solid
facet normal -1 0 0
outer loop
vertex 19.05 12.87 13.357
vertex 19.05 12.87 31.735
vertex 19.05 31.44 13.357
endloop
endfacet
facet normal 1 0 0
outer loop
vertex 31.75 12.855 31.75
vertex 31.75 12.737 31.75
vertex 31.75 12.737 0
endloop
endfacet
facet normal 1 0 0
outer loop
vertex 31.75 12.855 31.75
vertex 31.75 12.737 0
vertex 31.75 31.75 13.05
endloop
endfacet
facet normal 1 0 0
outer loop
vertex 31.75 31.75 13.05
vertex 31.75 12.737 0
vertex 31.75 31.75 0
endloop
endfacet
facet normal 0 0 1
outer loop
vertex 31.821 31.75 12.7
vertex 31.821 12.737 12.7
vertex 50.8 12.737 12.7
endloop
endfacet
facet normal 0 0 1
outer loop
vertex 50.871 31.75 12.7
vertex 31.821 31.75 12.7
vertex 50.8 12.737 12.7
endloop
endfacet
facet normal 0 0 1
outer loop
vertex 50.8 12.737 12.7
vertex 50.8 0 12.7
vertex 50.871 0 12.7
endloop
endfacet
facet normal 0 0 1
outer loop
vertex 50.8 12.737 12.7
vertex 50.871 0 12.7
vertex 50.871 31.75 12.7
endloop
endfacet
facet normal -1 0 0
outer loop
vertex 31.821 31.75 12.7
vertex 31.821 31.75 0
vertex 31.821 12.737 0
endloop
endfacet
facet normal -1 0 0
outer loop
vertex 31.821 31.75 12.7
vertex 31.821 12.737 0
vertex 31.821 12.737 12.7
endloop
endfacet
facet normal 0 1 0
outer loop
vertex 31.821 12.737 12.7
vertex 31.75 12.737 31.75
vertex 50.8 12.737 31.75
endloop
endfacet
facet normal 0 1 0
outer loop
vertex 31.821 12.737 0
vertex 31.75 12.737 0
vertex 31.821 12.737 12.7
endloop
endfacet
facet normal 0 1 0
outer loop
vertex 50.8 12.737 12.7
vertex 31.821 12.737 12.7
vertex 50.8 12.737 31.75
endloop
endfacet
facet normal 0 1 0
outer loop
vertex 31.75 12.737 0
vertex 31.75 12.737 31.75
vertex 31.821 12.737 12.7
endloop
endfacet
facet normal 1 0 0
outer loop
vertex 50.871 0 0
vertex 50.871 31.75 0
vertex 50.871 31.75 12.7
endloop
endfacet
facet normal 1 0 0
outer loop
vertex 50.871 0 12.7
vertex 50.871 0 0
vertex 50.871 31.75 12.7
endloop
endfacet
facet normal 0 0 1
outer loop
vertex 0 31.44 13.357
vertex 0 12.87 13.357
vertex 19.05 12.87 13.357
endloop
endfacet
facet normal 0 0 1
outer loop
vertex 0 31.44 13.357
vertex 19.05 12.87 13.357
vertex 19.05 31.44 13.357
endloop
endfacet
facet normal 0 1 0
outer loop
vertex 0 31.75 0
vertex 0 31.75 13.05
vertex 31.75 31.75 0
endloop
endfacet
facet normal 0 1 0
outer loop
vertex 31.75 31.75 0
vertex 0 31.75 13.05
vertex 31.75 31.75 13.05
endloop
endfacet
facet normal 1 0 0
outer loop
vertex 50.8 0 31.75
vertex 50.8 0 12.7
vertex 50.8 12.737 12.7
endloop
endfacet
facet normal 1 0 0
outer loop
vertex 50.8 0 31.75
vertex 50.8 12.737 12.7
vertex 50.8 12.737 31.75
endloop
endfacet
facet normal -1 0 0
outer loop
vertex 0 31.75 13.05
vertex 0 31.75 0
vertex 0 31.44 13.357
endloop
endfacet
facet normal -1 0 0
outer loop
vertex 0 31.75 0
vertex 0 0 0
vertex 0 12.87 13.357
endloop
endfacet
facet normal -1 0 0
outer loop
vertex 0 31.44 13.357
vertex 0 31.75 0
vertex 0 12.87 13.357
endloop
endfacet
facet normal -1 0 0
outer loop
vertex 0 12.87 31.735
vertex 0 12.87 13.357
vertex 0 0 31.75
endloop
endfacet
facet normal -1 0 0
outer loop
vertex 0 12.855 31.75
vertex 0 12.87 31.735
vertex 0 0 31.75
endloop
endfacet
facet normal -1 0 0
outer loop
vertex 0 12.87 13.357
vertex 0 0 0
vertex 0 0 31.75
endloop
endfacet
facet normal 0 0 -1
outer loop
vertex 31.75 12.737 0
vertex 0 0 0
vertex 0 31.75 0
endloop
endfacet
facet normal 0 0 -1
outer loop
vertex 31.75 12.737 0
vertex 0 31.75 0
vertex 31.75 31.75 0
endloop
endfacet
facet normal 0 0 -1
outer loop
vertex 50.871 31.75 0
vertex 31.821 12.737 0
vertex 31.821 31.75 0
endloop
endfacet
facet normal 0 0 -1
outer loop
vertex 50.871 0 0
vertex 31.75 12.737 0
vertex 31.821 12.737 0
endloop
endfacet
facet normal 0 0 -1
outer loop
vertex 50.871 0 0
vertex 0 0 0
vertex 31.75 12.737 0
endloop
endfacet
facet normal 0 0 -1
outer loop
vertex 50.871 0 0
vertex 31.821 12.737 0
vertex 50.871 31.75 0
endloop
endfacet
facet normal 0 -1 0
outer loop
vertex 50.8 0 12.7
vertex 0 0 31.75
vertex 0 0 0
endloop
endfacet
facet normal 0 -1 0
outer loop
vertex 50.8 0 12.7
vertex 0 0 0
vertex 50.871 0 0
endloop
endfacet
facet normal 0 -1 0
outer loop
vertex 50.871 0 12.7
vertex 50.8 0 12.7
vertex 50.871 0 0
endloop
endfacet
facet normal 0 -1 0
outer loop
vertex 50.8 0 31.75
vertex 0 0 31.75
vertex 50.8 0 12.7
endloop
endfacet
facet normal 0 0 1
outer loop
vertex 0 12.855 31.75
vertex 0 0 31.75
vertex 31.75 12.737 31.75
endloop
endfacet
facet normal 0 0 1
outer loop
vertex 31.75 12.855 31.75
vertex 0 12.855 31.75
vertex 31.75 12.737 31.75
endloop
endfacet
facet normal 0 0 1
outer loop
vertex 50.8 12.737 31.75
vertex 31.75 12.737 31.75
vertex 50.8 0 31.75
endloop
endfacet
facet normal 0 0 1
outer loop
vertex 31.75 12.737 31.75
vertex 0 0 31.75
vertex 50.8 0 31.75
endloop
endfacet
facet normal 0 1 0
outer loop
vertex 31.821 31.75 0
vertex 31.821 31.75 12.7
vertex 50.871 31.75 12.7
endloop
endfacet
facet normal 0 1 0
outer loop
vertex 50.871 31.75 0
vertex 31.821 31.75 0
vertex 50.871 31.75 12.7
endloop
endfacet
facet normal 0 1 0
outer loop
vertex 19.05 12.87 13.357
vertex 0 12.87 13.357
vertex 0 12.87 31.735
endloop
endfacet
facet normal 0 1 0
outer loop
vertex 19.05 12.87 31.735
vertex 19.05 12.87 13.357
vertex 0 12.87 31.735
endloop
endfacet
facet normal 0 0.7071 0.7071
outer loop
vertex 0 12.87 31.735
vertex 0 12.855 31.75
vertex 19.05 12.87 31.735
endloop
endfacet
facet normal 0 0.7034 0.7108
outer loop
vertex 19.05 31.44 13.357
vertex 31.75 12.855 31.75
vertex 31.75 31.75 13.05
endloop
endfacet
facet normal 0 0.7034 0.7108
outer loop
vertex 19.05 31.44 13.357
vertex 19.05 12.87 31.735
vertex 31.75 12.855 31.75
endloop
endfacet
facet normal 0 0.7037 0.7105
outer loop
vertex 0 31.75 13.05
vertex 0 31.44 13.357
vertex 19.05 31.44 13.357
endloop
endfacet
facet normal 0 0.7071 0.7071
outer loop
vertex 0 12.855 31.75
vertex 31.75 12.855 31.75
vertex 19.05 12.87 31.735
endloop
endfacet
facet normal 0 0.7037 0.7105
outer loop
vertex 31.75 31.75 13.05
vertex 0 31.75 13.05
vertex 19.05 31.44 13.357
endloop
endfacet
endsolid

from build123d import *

# Parameters (mm, degrees)
F0_W     = 50.8
F0_H     = 31.75
F1_DEPTH = 31.75
F2_W     = 19.05
F2_H     = 19.05
F3_DEPTH = 19.05
F4_W     = 19.05
F4_H     = 19.05
F5_DEPTH = 31.751
F6_W     = 19.05
F6_H     = 12.7
F7_DEPTH = 31.75
F9_DEPTH = 50.871556


with BuildPart() as f1:
    # F0 (on Front) → F1 (new body)
    with BuildSketch(Plane.XZ):
        with Locations((25.4, 15.875)):
            Rectangle(F0_W, F0_H)
    extrude(amount=-F1_DEPTH)

    # F2 (on Right) → F3 (cut)
    with BuildSketch(Plane.YZ):
        with Locations((22.394827, 22.882153)):
            Rectangle(F2_W, F2_H)
    extrude(amount=F3_DEPTH, mode=Mode.SUBTRACT)

    # F4 (on Top) → F5 (cut, through all)
    with BuildSketch(Plane.XY):
        with Locations((41.275, 22.261919)):
            Rectangle(F4_W, F4_H)
    extrude(amount=F5_DEPTH, mode=Mode.SUBTRACT)

    # F6 (on Front) → F7 (join)
    with BuildSketch(Plane.XZ):
        with Locations((41.345556, 6.35)):
            Rectangle(F6_W, F6_H)
    extrude(amount=-F7_DEPTH)

    # F8 (on Right) → F9 (cut, through all)
    with BuildSketch(Plane.YZ):
        Polygon((31.830321, 32.020881), (12.781355, 31.822454), (31.830321, 12.970881), align=None)
    extrude(amount=F9_DEPTH, mode=Mode.SUBTRACT)


solid = f1.part
